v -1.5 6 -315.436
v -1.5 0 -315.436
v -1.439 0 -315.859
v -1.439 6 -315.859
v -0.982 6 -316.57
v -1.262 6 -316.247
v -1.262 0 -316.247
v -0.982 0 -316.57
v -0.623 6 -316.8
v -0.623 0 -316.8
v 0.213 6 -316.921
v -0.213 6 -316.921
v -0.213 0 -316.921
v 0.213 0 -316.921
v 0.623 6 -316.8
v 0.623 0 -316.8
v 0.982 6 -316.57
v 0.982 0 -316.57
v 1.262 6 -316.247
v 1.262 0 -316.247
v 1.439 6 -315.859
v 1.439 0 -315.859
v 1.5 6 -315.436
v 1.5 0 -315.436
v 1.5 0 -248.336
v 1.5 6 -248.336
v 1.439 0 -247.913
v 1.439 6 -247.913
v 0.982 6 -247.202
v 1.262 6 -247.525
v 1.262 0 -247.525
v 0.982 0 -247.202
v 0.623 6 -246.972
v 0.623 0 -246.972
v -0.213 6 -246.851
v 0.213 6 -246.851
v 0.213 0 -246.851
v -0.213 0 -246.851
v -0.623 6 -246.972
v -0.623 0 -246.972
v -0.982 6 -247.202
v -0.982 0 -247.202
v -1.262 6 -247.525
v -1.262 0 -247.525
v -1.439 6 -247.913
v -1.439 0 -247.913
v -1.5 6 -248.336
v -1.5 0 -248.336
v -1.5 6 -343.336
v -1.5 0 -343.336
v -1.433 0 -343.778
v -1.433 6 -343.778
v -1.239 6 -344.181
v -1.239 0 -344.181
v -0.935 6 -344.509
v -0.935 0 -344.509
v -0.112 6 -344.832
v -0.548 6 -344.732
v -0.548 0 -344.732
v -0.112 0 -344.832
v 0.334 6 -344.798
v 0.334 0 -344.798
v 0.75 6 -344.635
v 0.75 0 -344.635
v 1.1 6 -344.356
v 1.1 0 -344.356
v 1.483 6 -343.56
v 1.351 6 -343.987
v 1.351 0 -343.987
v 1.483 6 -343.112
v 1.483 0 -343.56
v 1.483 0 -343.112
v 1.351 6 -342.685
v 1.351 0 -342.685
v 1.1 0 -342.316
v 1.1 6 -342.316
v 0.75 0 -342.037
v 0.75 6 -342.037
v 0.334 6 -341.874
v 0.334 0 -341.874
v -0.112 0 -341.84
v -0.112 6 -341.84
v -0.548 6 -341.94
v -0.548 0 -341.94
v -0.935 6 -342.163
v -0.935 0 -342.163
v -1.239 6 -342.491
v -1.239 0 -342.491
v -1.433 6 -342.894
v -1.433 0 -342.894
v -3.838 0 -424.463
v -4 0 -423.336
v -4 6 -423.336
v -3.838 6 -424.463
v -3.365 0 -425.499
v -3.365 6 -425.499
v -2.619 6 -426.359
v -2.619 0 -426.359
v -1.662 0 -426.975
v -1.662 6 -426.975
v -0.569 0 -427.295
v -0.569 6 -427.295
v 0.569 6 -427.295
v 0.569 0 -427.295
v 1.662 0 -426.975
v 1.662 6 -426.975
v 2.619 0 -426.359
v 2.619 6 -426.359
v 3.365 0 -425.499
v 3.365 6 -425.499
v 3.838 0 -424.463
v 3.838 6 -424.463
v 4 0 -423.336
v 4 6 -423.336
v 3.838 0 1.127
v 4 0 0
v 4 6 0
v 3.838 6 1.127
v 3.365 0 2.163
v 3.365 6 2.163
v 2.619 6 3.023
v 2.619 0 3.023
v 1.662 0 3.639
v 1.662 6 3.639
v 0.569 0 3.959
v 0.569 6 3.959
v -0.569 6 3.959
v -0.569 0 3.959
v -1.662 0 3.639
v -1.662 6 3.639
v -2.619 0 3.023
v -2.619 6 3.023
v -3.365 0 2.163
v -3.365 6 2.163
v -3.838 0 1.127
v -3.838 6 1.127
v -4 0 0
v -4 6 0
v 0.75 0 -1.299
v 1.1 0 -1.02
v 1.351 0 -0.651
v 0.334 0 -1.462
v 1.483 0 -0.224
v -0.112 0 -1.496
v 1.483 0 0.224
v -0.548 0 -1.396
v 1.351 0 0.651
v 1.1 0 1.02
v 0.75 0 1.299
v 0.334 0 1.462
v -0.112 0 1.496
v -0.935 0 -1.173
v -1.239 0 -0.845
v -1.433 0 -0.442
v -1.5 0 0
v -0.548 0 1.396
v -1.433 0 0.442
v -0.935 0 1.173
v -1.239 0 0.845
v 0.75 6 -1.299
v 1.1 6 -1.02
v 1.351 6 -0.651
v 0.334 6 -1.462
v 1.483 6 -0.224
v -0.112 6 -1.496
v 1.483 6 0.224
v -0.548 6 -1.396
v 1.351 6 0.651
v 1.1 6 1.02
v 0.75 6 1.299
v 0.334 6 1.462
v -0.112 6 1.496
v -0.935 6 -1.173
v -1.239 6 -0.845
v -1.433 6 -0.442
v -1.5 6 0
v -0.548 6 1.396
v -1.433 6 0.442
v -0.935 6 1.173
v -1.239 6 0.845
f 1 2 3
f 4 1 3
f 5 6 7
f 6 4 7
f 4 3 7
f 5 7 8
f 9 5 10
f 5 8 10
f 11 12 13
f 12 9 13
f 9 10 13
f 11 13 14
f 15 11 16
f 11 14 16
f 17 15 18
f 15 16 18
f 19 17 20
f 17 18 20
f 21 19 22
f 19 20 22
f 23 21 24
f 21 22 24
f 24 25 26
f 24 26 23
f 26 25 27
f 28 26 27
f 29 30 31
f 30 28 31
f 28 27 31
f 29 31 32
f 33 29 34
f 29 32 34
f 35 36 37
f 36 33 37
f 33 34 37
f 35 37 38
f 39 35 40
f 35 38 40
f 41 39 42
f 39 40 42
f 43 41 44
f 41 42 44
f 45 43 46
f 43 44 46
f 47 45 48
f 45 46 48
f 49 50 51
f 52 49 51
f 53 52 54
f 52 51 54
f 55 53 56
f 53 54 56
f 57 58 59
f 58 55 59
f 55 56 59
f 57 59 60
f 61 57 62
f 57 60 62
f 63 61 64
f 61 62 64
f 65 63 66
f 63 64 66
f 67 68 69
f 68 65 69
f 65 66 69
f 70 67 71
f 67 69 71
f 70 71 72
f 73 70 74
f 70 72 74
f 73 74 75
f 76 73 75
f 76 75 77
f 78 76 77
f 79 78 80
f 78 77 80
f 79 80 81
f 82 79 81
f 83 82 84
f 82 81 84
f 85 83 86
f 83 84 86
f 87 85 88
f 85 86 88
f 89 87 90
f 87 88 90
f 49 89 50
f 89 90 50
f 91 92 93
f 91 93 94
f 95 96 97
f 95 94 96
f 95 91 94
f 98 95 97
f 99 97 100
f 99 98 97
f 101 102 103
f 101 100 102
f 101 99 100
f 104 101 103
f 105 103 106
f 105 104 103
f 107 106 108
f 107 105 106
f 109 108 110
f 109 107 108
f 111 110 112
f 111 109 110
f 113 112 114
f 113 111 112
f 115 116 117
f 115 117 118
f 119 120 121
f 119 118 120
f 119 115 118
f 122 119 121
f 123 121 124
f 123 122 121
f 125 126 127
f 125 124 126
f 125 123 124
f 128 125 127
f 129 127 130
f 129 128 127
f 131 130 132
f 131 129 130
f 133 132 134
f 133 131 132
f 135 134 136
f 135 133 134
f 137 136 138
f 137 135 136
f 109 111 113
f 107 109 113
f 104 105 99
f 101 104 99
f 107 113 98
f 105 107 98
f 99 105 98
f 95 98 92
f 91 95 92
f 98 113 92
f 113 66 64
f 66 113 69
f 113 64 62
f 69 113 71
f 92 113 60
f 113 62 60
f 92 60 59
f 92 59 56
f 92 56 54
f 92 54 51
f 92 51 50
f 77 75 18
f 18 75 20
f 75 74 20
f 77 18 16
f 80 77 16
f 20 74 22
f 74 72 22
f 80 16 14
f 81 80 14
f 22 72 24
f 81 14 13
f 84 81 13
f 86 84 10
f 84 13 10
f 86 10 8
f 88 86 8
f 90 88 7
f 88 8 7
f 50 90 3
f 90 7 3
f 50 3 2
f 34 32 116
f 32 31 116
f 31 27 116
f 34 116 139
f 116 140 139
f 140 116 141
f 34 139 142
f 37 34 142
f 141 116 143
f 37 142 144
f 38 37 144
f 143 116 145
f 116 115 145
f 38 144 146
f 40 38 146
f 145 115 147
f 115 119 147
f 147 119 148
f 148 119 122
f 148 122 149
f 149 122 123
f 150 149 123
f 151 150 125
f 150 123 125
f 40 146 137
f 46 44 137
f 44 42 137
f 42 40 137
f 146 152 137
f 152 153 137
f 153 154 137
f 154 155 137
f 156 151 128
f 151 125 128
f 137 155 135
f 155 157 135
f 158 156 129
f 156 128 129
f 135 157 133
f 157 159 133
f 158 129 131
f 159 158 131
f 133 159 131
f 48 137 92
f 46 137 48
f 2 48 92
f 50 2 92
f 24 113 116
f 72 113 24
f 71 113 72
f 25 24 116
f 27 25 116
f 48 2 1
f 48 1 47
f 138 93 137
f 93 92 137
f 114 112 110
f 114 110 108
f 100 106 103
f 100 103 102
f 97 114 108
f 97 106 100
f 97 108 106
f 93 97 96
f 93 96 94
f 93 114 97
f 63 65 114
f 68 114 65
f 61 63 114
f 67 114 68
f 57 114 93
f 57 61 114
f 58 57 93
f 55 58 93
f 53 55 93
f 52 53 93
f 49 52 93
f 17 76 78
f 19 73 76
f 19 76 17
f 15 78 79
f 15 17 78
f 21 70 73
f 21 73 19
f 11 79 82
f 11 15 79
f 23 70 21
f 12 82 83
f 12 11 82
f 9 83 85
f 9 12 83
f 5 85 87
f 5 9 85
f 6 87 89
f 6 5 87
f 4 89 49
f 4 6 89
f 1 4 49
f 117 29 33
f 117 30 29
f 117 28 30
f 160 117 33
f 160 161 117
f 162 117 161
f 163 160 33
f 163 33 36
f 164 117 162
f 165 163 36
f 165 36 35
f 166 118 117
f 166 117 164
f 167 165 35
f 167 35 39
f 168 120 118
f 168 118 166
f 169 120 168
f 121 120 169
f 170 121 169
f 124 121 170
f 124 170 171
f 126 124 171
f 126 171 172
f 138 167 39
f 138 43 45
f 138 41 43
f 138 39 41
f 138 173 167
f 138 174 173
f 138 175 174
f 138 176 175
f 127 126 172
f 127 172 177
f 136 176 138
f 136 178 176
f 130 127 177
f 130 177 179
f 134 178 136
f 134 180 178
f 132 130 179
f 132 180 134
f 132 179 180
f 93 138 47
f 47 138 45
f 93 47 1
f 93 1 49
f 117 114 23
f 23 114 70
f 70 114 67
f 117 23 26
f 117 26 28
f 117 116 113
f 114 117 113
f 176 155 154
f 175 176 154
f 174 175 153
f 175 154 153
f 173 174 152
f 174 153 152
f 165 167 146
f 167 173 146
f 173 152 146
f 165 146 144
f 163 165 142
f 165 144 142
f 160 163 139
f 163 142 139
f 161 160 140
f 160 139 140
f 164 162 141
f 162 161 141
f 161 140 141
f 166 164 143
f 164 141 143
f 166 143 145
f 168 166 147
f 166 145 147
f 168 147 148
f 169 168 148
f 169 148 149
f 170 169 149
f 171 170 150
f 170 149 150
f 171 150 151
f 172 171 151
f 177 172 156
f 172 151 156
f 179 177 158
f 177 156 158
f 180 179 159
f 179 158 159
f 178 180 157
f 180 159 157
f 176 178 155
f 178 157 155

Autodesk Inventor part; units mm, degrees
ref_plane "XZ Plane" through (0, 0, 0) normal (0, 1, 0) x (-1, 0, 0)
ref_plane "XY Plane" through (0, 0, 0) normal (0, 0, 1) x (1, 0, 0)
sketch "Sketch1" plane through (0, 0, 0) normal (0, 1, 0) x (-1, 0, 0)
  line L0 (0, 0) -> (0, -343.336) construction
  line L1 (-4, 0) -> (-4, -343.336)
  line L2 (4, -343.336) -> (4, 0)
  arc A0 (4, 0) -> (-4, 0) centre (0, 0) ccw
  arc A1 (-4, -343.336) -> (4, -343.336) centre (0, -343.336) ccw
  circle A2 centre (0, 0) radius 1.5
  circle A3 centre (0, -343.336) radius 1.5
  line L3 (0, -315.436) -> (0, -248.336) construction
  line L4 (1.5, -315.436) -> (1.5, -248.336)
  line L5 (-1.5, -248.336) -> (-1.5, -315.436)
  arc A4 (-1.5, -315.436) -> (1.5, -315.436) centre (0, -315.436) ccw
  arc A5 (1.5, -248.336) -> (-1.5, -248.336) centre (0, -248.336) ccw
  line L6 (0, -343.336) -> (0, -423.336) construction
  line L7 (-4, -343.336) -> (-4, -423.336)
  line L8 (4, -423.336) -> (4, -343.336)
  arc A6 (4, -343.336) -> (-4, -343.336) centre (0, -343.336) ccw
  arc A7 (-4, -423.336) -> (4, -423.336) centre (0, -423.336) ccw
  point P0 (0, -171.668)
  point P1 (0, -281.886)
  point P2 (0, -383.336)
  dimension "d0" = 8
  dimension "d1" = 343.336
  dimension "d2" = 3
  dimension "d3" = 3
  dimension "d14" = 3
  dimension "d15" = 27.9
  dimension "d16" = 95
  dimension "d17" = 8
  dimension "d18" = 80
extrude "Extrusion1" add sketch "Sketch1" along normal blind 6
sketch "Sketch3" plane through (0, 6, 0) normal (0, 1, 0) x (1, 0, 0)
  line L0 (-4, 423.336) -> (-4, 0) projected
  line L1 (-4, 214.6062) -> (0, 206.0281)
  line L2 (0, 206.0281) -> (4, 214.6062)
  line L3 (4, 0) -> (4, 423.336) projected
  line L4 (-4, 423.336) -> (-4, 0) projected
  arc A0 (-4, 0) -> (4, 0) centre (0, 0) ccw projected
  line L5 (4, 0) -> (4, 423.336) projected
  arc A1 (4, 423.336) -> (-4, 423.336) centre (0, 423.336) ccw projected
  arc A2 (1.5, 315.436) -> (-1.5, 315.436) centre (0, 315.436) ccw projected
  line L6 (1.5, 315.436) -> (1.5, 248.336) projected
  arc A3 (-1.5, 248.336) -> (1.5, 248.336) centre (0, 248.336) ccw projected
  line L7 (-1.5, 248.336) -> (-1.5, 315.436) projected
  circle A4 centre (0, 343.336) radius 1.5 projected
  circle A5 centre (0, 0) radius 1.5 projected
  dimension "d21" = 25
  dimension "d22" = 25
extrude "Extrusion2" [suppressed]
